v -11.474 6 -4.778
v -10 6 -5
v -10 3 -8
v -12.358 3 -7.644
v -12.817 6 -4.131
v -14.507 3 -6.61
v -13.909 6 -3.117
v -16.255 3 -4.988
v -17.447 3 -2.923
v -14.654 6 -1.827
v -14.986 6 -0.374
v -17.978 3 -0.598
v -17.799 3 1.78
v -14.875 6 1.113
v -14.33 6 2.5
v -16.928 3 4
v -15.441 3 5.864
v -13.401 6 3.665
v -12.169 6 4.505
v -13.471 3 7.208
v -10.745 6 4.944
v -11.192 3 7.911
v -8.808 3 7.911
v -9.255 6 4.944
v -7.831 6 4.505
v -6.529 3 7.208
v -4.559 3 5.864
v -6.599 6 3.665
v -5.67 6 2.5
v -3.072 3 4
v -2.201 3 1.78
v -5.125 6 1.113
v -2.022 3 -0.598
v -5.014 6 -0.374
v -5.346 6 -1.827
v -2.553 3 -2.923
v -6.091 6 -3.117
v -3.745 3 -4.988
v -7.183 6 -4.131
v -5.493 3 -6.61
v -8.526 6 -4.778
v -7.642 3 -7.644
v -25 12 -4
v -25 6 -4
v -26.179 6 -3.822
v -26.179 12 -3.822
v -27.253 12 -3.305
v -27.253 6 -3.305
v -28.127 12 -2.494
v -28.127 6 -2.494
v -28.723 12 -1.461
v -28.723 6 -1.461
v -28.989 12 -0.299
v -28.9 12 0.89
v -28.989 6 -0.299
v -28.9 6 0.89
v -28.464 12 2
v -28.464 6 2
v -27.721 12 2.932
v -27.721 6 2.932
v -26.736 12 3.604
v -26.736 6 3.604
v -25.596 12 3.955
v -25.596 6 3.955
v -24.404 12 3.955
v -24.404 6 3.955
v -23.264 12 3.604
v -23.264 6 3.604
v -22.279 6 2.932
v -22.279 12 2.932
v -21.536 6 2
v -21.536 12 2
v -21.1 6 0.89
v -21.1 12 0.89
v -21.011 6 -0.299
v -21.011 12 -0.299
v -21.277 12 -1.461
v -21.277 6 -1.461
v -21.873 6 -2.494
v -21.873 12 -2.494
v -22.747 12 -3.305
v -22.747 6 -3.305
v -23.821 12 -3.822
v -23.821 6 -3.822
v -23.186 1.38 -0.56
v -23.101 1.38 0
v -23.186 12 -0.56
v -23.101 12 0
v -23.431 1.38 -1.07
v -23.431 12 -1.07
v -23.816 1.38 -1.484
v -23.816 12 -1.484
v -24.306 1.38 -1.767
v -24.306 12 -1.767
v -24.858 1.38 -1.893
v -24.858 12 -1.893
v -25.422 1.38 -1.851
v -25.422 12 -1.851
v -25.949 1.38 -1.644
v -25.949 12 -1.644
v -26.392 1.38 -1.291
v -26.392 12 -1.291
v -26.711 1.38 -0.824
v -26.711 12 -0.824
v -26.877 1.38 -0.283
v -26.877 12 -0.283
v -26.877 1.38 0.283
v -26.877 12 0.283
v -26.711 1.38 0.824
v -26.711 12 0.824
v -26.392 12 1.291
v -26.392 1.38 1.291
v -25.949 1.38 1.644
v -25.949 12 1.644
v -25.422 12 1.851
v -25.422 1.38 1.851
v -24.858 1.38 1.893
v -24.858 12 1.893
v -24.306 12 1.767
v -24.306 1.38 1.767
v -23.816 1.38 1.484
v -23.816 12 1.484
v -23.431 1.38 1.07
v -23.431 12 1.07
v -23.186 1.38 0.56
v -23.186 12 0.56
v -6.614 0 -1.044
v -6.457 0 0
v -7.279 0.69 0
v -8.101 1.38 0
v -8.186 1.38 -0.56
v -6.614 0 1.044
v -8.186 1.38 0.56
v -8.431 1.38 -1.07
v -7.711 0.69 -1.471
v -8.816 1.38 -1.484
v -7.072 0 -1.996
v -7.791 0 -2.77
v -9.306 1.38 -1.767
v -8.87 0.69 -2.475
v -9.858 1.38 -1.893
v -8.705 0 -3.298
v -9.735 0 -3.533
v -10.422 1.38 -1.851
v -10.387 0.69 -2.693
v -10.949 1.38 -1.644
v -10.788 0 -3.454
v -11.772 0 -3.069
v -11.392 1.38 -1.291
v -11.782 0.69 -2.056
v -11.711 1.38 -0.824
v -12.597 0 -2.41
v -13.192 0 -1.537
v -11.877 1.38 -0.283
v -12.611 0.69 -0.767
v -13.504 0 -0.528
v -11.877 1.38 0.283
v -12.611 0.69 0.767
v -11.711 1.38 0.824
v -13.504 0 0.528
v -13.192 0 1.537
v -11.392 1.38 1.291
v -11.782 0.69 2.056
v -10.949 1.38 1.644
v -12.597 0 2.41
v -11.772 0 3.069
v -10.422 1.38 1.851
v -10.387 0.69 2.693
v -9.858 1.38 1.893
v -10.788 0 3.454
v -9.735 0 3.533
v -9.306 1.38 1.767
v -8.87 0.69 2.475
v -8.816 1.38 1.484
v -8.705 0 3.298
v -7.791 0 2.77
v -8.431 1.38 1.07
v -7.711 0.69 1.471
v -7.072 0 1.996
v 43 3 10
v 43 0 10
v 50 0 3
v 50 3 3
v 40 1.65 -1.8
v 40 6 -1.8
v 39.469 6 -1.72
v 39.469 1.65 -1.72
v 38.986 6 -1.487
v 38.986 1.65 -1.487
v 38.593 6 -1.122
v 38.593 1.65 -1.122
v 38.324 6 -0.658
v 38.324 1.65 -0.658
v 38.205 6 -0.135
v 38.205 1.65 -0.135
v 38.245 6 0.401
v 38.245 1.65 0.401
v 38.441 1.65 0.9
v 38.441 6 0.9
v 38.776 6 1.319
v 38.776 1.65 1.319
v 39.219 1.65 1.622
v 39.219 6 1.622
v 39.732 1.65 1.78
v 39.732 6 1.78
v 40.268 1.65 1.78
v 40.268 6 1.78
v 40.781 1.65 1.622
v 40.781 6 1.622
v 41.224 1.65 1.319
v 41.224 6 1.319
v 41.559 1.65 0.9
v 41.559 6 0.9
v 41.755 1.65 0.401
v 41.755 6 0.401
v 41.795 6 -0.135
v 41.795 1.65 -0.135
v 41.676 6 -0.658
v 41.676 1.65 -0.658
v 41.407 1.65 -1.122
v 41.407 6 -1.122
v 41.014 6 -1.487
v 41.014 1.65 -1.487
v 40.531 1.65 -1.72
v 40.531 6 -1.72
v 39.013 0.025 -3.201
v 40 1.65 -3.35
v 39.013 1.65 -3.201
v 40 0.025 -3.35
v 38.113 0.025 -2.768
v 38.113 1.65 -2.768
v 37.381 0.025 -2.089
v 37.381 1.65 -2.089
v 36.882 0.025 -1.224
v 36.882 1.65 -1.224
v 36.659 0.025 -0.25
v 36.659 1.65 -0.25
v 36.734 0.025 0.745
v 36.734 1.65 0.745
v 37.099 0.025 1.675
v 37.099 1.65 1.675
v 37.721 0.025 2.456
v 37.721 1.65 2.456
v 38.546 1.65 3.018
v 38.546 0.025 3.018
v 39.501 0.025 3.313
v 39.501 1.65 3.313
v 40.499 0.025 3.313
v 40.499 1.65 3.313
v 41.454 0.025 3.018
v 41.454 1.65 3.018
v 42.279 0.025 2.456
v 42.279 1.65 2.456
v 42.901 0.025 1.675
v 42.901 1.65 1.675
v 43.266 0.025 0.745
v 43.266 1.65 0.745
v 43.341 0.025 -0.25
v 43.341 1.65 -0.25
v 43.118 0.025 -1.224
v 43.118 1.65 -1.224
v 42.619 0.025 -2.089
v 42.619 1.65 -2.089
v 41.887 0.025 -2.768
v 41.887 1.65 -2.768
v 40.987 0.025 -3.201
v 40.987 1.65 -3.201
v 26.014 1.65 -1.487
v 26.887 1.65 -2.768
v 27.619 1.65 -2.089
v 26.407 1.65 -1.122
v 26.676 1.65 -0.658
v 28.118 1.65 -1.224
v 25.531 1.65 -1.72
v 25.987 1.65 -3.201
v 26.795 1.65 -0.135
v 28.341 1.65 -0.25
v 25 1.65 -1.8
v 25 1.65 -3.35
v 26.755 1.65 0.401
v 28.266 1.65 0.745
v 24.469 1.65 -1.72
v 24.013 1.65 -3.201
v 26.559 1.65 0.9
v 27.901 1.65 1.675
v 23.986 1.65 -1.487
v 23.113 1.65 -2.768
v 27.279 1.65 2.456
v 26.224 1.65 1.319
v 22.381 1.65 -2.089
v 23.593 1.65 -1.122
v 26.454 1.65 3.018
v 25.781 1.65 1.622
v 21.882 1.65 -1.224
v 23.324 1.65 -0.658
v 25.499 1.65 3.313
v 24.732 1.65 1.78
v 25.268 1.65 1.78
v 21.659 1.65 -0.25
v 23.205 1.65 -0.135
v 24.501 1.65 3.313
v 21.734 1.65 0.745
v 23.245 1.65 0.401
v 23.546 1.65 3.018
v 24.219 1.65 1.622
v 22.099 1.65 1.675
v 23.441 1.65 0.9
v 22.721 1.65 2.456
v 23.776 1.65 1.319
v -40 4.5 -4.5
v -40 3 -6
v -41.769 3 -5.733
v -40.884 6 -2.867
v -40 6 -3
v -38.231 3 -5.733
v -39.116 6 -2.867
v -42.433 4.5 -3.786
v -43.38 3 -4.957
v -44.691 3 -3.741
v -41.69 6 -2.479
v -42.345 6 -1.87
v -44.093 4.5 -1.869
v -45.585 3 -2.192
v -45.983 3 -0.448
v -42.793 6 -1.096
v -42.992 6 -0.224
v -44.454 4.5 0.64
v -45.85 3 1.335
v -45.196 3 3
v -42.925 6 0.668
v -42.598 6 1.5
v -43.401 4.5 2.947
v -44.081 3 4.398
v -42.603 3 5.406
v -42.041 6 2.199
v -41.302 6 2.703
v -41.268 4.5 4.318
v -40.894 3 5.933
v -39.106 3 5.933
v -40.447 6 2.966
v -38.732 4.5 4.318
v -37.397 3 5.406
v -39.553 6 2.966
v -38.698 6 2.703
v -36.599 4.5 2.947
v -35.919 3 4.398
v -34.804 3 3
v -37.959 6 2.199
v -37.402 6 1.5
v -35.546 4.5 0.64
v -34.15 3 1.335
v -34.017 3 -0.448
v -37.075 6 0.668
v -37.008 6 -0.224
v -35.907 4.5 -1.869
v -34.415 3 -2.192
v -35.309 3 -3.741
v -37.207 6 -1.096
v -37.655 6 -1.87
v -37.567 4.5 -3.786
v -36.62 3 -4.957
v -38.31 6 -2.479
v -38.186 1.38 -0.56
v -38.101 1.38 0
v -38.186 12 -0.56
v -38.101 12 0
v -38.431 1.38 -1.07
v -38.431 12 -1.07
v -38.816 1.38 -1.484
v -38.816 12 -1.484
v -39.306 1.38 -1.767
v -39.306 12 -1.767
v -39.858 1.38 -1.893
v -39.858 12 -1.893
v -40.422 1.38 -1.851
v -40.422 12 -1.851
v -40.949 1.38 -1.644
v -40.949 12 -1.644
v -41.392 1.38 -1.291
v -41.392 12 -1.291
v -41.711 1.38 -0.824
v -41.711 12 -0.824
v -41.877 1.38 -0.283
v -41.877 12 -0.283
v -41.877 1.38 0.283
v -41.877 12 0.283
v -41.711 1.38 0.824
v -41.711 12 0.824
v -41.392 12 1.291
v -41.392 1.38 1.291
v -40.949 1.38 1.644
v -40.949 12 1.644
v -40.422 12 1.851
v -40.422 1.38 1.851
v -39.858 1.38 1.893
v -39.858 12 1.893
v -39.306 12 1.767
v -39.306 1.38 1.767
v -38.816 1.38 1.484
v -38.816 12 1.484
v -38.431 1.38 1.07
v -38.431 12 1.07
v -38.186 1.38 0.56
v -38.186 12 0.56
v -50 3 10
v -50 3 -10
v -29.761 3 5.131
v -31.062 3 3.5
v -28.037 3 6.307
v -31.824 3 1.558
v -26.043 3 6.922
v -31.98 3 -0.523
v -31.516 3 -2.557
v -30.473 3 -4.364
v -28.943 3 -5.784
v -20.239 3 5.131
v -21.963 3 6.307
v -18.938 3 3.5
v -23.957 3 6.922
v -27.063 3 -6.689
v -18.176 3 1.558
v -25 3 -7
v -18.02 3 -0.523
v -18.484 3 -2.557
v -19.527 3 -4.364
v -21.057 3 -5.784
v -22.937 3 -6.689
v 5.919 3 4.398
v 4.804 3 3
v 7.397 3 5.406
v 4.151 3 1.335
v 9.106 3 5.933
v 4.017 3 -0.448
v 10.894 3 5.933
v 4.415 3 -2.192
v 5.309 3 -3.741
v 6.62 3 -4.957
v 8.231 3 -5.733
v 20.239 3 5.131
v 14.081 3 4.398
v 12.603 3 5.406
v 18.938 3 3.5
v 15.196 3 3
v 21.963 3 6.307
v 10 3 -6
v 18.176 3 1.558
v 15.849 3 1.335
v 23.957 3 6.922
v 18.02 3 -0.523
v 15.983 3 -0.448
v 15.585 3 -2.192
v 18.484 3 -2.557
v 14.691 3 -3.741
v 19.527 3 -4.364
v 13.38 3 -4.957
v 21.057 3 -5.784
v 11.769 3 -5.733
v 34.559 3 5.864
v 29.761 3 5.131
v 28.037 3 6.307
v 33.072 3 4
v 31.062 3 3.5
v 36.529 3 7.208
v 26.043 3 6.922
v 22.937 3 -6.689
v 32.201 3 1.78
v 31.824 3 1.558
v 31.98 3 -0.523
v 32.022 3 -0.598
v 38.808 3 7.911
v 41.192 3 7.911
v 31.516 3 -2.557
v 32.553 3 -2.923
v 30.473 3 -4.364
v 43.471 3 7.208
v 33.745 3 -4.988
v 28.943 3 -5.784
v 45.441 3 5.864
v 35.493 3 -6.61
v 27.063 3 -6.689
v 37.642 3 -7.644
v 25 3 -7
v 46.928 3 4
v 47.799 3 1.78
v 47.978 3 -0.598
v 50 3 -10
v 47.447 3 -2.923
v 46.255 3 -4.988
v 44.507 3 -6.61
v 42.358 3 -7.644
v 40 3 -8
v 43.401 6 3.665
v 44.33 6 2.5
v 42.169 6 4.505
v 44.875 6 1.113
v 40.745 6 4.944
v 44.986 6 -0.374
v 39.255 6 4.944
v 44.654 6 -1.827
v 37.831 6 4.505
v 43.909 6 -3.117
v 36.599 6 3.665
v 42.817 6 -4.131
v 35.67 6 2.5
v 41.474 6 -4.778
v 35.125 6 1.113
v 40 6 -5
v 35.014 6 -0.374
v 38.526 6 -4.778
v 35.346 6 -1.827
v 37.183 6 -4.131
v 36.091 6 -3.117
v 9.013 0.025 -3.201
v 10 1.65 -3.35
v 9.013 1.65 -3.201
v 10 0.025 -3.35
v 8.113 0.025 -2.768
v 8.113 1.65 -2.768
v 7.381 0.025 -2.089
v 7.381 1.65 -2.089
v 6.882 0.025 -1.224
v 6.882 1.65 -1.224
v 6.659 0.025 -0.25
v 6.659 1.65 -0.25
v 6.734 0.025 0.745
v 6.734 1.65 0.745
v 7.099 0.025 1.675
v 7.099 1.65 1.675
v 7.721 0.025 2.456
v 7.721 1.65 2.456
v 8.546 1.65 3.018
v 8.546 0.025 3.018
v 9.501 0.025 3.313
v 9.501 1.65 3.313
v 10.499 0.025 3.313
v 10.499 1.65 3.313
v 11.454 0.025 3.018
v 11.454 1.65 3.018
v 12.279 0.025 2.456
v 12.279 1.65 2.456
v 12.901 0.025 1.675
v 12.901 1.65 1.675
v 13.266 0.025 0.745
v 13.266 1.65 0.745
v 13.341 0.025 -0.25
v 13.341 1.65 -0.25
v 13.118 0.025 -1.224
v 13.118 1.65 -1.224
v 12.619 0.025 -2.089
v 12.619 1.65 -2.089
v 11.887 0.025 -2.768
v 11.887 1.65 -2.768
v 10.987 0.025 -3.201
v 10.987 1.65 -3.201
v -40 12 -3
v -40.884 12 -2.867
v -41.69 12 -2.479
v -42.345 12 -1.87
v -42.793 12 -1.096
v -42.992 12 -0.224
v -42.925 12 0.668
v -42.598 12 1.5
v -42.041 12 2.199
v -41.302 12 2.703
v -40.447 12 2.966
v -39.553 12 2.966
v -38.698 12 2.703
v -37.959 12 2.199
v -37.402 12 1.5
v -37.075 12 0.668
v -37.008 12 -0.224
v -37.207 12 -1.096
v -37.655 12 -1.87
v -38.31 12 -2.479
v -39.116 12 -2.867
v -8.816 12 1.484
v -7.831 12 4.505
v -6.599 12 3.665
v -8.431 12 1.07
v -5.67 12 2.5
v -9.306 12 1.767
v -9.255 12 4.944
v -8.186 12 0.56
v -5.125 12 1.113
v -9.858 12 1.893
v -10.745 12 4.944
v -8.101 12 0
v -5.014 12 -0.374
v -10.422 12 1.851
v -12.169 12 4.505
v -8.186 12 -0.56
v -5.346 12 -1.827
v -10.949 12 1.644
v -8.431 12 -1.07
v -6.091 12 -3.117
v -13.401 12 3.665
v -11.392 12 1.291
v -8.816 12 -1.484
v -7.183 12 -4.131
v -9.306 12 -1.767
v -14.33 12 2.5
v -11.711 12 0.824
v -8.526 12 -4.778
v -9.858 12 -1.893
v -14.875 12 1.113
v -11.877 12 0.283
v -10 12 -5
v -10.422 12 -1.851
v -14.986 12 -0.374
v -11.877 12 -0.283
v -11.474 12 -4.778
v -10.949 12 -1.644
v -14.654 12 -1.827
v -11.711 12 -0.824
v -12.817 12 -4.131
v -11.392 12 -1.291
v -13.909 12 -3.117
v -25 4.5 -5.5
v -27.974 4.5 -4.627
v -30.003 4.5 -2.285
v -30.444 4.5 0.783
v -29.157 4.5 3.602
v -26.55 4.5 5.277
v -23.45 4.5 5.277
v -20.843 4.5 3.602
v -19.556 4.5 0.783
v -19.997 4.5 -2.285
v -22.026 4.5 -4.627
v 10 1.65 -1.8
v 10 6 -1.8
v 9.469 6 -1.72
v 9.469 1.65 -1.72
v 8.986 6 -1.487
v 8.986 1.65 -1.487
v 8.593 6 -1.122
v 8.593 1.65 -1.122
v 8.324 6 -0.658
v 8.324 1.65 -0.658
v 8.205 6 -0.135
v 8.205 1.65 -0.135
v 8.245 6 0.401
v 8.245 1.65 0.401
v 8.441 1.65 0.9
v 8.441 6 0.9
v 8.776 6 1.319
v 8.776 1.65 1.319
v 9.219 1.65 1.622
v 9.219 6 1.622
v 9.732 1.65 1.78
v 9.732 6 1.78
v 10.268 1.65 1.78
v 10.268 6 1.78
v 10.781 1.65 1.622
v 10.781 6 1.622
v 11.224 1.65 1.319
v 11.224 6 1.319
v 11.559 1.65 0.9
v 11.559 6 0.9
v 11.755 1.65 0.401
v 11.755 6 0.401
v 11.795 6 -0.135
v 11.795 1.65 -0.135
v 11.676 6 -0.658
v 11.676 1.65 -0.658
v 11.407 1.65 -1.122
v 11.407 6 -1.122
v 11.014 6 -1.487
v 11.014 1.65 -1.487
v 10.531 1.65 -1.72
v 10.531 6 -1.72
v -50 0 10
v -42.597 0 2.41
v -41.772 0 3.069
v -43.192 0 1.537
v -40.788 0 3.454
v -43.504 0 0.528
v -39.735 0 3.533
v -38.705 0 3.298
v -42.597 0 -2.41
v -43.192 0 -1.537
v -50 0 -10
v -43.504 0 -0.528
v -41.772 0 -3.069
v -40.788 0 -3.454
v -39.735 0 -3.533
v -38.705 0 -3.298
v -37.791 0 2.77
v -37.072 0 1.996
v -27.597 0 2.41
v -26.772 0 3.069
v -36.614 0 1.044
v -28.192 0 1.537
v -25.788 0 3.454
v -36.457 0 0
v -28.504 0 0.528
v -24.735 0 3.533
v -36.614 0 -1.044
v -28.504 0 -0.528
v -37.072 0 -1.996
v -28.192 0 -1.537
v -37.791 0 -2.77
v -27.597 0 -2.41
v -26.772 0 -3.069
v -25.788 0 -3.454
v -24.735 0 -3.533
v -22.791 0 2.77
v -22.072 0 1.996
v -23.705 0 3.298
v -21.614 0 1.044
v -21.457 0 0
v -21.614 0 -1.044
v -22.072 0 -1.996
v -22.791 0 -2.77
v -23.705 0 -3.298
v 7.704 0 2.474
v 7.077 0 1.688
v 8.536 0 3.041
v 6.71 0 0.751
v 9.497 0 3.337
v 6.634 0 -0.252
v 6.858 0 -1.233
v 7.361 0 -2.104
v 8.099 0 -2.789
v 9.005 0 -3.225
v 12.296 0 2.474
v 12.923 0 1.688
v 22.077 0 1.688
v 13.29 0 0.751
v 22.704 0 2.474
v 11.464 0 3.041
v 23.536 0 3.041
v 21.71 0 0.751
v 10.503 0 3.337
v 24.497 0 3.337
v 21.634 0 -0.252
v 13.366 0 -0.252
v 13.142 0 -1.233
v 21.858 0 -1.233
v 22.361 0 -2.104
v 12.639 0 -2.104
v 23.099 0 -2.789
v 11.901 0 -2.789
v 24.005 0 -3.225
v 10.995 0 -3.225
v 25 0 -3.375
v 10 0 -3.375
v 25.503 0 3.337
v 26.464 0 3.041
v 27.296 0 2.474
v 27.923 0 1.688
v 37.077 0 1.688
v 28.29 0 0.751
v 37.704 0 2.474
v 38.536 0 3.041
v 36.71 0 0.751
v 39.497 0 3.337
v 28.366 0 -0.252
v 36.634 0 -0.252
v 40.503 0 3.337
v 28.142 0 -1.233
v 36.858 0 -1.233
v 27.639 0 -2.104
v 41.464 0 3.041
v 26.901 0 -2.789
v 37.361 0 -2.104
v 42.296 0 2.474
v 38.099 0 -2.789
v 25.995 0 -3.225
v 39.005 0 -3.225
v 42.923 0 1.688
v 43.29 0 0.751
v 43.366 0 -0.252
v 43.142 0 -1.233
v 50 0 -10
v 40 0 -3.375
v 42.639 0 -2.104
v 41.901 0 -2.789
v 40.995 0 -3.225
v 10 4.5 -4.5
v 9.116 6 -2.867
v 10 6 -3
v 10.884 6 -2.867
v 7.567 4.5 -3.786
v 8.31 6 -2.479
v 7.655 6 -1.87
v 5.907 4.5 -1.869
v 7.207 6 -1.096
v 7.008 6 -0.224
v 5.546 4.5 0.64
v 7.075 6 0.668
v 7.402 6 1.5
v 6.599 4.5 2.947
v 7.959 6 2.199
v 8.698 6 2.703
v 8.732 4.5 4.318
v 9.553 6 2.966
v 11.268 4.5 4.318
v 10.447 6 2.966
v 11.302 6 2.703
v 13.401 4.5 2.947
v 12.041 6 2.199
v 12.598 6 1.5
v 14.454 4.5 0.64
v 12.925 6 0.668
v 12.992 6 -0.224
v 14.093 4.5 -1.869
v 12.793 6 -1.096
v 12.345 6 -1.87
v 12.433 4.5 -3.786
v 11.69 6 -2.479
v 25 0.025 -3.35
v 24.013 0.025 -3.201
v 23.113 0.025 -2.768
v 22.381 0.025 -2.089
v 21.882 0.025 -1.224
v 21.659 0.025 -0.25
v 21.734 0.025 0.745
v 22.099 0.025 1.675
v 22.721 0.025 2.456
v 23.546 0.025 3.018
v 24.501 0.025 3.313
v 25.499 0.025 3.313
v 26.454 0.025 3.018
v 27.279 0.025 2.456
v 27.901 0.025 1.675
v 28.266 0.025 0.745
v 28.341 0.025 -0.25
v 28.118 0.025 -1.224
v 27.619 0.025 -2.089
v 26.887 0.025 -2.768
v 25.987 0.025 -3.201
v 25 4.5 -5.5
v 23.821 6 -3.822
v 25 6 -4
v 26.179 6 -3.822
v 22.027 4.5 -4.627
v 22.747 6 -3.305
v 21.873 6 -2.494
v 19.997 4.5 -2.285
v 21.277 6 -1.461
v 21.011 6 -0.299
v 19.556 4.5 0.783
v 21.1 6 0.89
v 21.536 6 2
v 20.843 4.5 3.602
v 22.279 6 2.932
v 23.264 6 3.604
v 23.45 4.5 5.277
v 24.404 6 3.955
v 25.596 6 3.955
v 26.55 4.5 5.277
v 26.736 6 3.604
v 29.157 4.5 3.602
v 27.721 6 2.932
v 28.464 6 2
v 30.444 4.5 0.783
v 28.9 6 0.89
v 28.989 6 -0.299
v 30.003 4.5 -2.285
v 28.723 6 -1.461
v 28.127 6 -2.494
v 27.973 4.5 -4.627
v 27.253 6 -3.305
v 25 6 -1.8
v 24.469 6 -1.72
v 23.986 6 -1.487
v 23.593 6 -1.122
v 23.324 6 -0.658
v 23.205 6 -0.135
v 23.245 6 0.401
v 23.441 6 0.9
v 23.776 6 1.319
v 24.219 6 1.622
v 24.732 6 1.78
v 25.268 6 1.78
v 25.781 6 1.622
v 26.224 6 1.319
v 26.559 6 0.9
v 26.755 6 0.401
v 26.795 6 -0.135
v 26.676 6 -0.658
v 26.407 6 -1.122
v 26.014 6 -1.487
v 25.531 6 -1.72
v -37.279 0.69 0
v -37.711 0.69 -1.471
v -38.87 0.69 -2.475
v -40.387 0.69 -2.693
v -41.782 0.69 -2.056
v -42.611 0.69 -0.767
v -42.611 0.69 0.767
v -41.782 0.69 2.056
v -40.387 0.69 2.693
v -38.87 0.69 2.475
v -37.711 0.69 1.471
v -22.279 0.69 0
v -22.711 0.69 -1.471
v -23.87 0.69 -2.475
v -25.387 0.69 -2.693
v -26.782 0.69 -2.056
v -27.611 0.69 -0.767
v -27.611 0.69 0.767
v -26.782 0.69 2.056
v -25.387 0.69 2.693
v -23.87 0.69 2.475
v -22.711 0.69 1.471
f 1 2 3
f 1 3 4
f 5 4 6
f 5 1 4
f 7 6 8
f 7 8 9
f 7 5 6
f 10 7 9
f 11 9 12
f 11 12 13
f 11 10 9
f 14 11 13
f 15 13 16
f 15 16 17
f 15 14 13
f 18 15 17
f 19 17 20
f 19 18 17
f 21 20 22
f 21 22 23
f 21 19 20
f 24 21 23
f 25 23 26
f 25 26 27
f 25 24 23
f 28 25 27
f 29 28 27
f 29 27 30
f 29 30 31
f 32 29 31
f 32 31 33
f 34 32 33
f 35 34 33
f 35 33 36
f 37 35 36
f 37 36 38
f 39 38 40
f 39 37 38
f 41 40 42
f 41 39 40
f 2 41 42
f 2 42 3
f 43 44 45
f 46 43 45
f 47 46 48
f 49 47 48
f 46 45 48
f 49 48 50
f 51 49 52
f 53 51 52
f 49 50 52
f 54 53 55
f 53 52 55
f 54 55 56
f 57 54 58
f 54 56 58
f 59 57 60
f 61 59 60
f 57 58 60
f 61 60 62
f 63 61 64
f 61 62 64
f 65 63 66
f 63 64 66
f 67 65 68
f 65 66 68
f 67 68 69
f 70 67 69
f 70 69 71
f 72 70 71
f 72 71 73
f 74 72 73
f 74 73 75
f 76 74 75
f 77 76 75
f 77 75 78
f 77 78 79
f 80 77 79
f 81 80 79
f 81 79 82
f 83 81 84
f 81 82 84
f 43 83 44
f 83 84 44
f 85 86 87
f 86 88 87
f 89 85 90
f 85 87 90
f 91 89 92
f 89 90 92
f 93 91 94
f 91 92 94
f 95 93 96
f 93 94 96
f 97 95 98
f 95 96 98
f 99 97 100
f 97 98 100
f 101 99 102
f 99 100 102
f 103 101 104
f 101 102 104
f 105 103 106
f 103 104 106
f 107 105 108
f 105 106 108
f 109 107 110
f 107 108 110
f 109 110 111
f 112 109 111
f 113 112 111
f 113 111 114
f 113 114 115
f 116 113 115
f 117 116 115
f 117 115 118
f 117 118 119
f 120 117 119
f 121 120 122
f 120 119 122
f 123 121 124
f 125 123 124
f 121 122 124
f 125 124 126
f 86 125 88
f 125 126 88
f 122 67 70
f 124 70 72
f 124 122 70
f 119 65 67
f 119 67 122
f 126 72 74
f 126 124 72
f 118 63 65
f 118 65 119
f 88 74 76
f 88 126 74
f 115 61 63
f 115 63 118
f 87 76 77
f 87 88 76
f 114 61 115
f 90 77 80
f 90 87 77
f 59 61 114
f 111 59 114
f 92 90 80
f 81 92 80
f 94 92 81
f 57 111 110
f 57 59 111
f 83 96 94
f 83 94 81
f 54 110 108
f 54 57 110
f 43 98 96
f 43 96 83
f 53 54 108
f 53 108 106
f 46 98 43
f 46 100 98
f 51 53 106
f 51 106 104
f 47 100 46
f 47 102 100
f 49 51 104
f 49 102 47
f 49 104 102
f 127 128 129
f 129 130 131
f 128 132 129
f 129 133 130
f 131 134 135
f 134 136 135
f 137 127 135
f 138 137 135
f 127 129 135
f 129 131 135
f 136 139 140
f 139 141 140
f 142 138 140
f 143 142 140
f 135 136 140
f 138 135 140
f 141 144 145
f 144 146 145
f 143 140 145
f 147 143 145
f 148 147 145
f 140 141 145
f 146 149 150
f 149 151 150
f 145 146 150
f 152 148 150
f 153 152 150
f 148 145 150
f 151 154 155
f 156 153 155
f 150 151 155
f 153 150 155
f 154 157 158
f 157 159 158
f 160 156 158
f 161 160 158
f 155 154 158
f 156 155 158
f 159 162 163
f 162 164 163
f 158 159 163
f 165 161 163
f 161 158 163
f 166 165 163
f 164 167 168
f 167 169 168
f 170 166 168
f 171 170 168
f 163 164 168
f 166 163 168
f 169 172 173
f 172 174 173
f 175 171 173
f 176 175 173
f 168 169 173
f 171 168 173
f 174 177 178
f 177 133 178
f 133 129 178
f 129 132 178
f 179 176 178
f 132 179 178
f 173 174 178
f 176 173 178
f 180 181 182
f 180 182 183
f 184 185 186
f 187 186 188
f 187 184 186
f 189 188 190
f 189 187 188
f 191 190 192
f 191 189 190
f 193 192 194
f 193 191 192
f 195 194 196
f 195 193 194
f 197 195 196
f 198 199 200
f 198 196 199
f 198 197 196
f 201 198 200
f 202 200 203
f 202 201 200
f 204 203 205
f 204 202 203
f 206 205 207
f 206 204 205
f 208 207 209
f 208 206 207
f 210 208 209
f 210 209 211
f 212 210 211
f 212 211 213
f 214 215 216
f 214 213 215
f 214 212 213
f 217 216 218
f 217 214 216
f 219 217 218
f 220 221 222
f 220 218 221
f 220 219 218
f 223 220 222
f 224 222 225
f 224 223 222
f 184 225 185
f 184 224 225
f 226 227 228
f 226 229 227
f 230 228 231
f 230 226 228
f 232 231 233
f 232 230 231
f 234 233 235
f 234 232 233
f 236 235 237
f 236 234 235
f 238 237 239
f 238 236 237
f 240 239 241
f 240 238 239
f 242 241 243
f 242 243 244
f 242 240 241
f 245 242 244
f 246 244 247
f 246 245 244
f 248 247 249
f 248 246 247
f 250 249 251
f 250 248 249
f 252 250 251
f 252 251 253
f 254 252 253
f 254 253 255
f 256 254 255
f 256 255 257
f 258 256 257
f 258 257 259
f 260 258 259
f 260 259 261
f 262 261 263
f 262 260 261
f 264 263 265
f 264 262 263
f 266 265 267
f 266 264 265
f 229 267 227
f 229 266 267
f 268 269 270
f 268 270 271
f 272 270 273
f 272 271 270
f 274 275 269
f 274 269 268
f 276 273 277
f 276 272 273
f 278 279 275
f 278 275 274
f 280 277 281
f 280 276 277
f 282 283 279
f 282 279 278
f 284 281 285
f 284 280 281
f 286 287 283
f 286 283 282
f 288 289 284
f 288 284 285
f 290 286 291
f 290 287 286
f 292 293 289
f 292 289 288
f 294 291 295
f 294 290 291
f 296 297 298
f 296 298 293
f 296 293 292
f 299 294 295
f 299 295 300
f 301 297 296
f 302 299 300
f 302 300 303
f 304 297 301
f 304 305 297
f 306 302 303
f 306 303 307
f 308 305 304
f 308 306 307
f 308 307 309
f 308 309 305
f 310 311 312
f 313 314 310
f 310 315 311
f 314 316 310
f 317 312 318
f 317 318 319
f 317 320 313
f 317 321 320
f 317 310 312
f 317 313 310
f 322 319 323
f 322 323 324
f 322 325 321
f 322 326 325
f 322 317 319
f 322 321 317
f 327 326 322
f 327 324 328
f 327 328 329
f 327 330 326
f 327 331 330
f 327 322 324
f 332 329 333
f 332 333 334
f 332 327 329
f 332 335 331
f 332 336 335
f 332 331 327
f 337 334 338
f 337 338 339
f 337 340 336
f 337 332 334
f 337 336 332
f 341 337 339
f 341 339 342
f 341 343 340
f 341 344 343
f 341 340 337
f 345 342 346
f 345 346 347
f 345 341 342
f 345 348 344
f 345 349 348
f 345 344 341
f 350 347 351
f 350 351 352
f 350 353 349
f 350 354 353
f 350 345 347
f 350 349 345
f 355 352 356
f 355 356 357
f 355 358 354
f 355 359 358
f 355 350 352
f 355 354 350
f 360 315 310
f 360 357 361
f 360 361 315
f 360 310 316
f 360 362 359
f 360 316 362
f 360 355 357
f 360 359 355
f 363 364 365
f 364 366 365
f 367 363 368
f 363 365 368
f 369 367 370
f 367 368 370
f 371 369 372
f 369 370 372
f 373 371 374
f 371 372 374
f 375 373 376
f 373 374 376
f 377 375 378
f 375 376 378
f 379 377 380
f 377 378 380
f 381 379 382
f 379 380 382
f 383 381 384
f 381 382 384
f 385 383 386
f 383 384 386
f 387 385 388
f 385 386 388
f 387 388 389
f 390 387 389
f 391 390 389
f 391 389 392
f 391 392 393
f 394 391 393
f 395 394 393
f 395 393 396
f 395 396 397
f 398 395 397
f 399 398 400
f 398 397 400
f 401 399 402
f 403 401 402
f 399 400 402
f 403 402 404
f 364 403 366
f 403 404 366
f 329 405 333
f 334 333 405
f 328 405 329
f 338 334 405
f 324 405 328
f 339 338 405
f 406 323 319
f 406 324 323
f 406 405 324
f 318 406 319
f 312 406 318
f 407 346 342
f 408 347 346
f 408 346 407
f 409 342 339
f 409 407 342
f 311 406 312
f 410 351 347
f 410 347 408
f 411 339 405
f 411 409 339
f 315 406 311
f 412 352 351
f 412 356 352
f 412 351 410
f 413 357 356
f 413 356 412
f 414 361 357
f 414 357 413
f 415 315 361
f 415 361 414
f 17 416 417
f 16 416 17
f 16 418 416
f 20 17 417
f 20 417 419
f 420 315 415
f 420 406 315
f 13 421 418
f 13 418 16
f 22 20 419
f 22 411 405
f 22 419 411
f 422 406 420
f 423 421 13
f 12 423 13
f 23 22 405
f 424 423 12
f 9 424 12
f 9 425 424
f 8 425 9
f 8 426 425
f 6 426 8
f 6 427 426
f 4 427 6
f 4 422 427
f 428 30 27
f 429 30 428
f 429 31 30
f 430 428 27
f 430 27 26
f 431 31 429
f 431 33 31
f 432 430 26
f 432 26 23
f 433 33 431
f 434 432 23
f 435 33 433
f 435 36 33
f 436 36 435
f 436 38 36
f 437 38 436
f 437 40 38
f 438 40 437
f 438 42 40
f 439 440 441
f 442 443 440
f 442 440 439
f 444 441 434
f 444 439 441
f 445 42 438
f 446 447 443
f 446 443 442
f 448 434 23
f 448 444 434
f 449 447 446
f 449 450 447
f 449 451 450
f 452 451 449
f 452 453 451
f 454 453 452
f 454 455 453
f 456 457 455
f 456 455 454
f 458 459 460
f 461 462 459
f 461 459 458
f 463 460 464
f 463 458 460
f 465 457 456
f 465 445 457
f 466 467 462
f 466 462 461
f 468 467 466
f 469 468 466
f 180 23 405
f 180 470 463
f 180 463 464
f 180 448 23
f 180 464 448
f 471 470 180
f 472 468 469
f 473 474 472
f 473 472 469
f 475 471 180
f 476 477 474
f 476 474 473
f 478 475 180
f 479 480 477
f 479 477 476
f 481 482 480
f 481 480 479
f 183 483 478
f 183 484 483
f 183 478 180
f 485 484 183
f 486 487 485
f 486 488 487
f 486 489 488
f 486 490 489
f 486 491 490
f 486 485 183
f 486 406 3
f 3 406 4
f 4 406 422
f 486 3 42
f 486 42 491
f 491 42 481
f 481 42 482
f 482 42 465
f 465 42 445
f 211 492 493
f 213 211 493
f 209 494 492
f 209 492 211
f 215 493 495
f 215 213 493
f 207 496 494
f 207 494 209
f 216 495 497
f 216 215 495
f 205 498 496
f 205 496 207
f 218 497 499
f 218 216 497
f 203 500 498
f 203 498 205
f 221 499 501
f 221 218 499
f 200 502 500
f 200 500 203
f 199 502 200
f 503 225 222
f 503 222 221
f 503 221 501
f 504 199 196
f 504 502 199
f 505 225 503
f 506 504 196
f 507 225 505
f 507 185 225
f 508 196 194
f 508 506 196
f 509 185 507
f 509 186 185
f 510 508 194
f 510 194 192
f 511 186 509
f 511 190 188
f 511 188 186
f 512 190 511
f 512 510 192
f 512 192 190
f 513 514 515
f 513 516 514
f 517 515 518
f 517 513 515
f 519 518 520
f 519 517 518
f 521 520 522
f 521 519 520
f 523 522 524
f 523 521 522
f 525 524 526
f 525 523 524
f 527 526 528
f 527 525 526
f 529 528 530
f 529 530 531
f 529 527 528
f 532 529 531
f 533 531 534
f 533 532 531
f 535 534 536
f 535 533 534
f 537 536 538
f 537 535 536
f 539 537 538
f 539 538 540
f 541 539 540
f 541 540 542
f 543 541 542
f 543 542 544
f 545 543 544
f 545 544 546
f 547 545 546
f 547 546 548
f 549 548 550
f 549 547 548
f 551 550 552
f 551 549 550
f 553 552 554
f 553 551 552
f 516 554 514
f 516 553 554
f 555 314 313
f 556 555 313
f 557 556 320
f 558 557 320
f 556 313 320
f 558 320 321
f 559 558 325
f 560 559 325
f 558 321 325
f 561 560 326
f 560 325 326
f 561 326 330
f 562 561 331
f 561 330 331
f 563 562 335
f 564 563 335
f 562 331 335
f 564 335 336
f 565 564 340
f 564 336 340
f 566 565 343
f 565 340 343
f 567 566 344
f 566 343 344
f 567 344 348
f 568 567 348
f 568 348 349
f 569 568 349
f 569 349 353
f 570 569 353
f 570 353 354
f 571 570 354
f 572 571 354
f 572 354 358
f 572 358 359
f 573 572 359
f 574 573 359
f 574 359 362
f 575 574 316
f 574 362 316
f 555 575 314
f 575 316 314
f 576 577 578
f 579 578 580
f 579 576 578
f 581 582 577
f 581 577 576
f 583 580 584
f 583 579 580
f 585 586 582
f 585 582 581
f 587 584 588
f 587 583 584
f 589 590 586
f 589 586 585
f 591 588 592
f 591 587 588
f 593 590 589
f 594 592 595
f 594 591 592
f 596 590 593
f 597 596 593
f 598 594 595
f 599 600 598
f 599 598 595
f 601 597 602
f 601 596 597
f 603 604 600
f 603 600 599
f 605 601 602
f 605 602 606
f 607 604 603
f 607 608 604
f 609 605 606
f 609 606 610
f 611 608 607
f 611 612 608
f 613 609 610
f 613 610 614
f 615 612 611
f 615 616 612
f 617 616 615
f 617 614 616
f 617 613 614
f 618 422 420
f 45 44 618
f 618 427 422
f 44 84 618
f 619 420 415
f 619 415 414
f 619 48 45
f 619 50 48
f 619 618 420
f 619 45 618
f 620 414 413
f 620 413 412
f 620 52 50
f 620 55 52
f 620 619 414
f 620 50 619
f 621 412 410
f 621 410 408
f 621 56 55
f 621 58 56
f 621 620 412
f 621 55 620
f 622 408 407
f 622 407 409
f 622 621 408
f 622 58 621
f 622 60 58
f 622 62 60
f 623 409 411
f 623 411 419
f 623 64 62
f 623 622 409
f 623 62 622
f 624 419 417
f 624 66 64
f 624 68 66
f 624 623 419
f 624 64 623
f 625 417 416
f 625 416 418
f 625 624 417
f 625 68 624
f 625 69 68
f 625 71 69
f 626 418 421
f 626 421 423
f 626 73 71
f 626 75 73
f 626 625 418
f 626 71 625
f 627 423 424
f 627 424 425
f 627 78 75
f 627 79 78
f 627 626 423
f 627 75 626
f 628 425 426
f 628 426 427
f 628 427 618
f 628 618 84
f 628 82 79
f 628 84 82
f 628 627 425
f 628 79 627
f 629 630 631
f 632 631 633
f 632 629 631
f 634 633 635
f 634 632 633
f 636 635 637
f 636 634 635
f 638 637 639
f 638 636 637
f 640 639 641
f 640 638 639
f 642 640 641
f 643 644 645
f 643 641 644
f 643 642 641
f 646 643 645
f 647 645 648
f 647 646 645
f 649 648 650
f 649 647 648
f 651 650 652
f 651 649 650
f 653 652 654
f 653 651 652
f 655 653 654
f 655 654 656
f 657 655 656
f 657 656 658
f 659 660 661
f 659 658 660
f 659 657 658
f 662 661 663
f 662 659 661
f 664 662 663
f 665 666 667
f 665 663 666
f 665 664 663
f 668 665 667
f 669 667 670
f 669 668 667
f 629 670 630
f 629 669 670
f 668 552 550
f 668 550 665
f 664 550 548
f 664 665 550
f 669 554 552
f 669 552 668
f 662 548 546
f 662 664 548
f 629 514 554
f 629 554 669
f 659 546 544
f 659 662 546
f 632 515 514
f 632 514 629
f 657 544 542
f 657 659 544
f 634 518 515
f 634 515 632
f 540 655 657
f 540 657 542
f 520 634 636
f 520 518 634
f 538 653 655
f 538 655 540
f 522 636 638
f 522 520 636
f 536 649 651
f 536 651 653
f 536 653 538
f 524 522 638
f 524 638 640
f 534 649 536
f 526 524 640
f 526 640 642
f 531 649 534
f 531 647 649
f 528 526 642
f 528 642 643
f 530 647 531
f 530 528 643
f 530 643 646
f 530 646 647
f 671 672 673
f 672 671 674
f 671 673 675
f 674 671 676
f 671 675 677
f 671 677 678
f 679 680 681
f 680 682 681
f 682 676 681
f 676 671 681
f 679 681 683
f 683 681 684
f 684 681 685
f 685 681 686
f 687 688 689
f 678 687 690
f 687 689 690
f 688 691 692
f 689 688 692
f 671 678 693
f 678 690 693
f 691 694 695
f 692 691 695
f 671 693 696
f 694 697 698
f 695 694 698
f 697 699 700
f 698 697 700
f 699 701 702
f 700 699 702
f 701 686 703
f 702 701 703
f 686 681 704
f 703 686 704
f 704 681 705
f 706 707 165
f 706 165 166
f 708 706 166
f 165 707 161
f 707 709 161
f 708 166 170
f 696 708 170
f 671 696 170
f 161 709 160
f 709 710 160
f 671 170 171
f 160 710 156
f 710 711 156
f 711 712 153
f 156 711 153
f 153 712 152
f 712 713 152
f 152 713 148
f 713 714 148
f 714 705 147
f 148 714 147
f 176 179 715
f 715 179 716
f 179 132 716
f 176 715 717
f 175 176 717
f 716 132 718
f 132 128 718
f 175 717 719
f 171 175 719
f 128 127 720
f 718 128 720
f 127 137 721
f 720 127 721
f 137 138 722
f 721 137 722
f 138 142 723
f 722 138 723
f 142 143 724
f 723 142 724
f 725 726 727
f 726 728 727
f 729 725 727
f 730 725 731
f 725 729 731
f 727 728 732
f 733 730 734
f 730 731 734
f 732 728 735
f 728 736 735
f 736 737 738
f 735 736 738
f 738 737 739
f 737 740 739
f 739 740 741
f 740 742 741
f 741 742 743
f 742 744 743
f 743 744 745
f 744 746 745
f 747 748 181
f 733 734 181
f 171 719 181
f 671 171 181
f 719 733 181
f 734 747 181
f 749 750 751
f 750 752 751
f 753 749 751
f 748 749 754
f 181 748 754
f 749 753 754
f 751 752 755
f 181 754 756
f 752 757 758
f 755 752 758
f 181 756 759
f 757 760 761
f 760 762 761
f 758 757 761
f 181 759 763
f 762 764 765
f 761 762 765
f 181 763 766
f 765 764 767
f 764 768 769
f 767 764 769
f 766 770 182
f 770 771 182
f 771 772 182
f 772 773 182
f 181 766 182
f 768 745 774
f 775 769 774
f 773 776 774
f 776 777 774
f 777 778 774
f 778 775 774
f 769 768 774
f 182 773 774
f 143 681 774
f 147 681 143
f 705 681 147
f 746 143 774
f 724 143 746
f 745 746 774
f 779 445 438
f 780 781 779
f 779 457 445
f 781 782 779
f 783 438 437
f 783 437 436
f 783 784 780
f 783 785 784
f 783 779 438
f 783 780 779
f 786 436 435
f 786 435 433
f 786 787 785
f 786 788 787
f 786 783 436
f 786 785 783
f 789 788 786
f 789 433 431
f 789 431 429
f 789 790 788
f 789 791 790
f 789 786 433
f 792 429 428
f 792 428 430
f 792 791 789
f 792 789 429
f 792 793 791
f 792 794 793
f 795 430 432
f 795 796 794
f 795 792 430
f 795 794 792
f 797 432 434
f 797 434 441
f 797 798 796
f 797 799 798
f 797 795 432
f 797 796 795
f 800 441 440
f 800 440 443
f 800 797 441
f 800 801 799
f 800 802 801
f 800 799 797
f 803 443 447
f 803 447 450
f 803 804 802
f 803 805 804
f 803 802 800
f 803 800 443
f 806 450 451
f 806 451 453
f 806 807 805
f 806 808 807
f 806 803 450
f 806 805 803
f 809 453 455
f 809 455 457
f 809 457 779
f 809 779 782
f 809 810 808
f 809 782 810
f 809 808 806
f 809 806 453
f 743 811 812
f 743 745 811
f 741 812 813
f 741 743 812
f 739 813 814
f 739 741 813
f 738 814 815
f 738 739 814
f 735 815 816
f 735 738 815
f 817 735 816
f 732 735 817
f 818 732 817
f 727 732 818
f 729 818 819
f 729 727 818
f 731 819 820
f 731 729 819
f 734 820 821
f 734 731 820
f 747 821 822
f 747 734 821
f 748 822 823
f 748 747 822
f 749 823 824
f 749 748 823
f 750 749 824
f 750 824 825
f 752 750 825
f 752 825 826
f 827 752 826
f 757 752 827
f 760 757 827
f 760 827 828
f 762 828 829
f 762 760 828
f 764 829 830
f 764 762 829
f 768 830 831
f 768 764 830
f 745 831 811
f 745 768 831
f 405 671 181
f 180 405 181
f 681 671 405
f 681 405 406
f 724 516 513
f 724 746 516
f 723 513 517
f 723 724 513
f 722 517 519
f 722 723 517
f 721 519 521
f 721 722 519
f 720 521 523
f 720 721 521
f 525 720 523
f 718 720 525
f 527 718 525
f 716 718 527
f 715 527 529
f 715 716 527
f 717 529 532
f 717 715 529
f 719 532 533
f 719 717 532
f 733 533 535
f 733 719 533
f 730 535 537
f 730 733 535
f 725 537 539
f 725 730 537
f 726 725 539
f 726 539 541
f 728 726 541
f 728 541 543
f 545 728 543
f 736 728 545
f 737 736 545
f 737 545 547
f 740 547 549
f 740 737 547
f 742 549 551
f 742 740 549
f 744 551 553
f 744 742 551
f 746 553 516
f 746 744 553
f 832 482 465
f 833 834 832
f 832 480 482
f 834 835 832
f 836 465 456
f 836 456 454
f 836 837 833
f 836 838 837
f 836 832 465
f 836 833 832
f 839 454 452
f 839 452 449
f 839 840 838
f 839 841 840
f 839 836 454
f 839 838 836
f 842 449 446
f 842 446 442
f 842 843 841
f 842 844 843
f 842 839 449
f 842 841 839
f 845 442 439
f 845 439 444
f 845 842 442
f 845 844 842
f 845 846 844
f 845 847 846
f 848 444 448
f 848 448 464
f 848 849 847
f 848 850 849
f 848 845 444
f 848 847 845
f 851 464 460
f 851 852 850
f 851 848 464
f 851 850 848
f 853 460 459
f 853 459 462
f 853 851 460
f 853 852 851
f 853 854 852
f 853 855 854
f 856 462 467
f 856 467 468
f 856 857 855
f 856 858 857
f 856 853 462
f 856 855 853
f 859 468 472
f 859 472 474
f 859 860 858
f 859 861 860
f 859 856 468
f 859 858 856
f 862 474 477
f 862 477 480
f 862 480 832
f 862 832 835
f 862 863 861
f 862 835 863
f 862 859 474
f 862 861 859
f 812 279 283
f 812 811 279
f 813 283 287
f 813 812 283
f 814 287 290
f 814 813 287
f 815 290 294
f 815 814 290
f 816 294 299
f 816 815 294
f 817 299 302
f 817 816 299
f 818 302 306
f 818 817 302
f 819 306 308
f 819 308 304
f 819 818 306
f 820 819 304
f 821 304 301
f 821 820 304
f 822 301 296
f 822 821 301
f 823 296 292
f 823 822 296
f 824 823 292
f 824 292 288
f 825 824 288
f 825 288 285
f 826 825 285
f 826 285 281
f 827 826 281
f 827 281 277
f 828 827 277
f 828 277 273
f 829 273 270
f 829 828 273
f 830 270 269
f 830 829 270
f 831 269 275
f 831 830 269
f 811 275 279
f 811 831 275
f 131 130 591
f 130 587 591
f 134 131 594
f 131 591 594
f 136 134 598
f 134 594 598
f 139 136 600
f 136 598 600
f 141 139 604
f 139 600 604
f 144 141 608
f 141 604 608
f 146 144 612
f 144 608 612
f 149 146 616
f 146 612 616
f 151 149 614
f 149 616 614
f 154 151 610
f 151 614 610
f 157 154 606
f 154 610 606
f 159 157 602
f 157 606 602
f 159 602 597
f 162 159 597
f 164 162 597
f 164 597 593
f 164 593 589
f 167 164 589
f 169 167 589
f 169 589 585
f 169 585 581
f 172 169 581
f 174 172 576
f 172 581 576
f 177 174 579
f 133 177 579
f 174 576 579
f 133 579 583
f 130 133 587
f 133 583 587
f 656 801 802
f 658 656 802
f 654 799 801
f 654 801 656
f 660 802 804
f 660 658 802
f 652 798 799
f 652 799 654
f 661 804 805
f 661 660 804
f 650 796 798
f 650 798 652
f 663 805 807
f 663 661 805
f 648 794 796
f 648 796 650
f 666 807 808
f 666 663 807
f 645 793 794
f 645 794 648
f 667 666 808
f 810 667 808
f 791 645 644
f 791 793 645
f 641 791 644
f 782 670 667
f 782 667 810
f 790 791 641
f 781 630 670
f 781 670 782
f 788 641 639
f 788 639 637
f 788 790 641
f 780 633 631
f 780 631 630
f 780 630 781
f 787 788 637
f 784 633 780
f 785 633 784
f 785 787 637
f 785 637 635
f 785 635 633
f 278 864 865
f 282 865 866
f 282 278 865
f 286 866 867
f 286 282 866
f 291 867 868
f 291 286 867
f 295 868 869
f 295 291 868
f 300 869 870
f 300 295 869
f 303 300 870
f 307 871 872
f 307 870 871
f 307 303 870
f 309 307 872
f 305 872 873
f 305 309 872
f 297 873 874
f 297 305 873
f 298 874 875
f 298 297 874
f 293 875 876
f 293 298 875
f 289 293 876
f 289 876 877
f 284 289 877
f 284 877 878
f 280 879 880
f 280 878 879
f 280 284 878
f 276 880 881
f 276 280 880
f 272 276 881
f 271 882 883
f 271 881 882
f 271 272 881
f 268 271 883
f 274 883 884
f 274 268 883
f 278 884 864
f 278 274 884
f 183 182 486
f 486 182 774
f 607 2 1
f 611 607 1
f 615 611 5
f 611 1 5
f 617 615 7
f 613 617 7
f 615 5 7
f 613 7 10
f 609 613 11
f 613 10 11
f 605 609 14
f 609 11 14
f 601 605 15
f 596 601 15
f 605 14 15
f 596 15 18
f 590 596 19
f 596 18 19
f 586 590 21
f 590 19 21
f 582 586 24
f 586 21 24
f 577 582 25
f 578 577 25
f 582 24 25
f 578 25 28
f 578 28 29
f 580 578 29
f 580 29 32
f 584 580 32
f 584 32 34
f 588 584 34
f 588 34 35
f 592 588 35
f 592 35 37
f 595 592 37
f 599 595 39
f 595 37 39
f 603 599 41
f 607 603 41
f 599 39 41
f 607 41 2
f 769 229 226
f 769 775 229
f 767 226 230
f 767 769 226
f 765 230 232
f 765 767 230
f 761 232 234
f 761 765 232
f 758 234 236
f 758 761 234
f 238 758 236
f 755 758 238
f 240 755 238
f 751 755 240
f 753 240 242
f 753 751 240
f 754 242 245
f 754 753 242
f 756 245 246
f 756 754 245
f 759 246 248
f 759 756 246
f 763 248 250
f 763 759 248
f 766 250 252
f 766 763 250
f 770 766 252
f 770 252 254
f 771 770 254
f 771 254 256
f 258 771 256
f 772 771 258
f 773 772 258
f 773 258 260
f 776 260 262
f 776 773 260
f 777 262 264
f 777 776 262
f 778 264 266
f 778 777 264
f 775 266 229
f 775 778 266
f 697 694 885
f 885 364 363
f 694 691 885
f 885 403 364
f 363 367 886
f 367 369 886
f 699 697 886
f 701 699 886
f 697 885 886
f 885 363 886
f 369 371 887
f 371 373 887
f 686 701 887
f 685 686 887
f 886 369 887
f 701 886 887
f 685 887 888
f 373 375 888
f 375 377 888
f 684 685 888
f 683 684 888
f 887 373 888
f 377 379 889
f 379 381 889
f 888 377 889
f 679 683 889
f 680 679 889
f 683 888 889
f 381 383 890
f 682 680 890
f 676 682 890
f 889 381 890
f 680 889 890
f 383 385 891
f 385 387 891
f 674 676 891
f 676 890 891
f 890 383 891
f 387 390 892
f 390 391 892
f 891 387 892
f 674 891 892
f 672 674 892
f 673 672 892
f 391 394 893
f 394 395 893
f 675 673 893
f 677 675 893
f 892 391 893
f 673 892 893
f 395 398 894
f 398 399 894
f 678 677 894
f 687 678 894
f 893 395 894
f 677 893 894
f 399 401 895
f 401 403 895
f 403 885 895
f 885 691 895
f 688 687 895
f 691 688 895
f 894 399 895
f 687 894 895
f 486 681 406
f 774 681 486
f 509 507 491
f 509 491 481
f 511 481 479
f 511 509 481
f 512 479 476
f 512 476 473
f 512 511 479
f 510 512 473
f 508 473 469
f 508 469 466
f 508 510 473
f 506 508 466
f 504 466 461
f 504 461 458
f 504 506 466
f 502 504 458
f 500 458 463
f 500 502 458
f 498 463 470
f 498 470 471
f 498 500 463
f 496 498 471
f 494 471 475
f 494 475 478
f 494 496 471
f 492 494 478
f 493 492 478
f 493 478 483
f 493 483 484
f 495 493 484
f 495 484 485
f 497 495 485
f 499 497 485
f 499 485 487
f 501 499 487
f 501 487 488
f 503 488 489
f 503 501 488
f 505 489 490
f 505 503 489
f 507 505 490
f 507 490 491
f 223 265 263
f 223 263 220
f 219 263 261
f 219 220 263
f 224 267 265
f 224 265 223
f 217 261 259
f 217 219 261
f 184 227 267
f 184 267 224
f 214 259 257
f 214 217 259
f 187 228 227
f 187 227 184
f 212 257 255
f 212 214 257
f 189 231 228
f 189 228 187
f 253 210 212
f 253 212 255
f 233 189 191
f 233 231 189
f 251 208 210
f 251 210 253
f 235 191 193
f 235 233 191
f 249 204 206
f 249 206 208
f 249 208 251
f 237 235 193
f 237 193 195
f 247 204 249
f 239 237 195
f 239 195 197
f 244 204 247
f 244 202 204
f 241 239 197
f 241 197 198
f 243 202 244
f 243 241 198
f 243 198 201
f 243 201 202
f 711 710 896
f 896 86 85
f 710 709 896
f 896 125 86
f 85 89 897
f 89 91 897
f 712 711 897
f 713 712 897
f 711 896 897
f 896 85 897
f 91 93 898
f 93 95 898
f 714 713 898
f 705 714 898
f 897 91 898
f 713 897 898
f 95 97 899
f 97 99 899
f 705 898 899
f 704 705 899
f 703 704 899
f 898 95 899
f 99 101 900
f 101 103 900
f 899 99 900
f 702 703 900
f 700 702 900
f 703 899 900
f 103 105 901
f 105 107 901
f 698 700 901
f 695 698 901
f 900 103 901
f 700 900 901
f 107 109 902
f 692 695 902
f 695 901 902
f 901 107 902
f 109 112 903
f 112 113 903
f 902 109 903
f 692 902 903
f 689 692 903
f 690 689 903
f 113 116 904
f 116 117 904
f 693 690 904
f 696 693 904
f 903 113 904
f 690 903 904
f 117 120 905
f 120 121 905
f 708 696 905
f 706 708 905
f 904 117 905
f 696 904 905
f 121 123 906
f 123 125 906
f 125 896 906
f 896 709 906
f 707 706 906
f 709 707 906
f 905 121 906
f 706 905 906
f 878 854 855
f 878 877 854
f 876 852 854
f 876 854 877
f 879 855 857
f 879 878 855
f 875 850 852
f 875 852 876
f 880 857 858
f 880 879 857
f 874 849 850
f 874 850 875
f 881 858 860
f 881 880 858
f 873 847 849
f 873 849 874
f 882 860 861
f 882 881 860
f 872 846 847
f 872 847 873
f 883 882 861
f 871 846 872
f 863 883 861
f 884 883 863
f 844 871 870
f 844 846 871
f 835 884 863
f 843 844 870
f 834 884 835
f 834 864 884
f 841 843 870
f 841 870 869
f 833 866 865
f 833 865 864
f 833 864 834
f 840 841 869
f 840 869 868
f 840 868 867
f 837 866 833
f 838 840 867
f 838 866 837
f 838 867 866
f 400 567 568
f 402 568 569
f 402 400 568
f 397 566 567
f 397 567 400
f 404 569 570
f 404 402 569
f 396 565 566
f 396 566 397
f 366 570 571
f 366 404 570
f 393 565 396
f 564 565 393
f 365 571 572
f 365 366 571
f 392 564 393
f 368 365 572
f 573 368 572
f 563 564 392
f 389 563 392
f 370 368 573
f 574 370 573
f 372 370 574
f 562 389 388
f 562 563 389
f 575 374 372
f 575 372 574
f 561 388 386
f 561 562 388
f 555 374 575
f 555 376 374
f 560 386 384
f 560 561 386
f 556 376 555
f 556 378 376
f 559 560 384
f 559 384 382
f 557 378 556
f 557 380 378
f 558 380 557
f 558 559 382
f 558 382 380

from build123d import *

# Parameters (mm, degrees)
SKETCH1_W                                         = 100
SKETCH1_H                                         = 20
BOSS_EXTRUDE1_DEPTH                               = 3
SKETCH2_R                                         = 4
SKETCH2_R_2                                       = 3
SKETCH2_R_3                                       = 5
BOSS_EXTRUDE2_DEPTH                               = 9
CHAMFER1_SIZE                                     = 3
CSK_FOR_6_FLAT_HEAD_MACHINE_SCREW_100_D           = 3.7973
CSK_FOR_6_FLAT_HEAD_MACHINE_SCREW_100_CSINK_D     = 7.0866
CSK_FOR_6_FLAT_HEAD_MACHINE_SCREW_100_CSINK_ANGLE = 100
CSK_FOR_6_FLAT_HEAD_MACHINE_SCREW_2_D             = 3.7973
CSK_FOR_6_FLAT_HEAD_MACHINE_SCREW_2_CSINK_D       = 7.0866
CSK_FOR_6_FLAT_HEAD_MACHINE_SCREW_2_CSINK_ANGLE   = 100
CSK_FOR_6_FLAT_HEAD_MACHINE_SCREW_3_D             = 3.7973
CSK_FOR_6_FLAT_HEAD_MACHINE_SCREW_3_CSINK_D       = 7.0866
CSK_FOR_6_FLAT_HEAD_MACHINE_SCREW_3_CSINK_ANGLE   = 100
CHAMFER2_SIZE                                     = 3
CHAMFER3_SIZE                                     = 3
SKETCH14_R                                        = 3
SKETCH14_R_2                                      = 4
SKETCH14_R_3                                      = 5
BOSS_EXTRUDE3_DEPTH                               = 3
CHAMFER4_SIZE                                     = 3
LPATTERN1_COUNT                                   = 3
LPATTERN1_PITCH                                   = 15
CHAMFER5_SIZE                                     = 7


with BuildPart() as part:
    # Sketch1 → Boss-Extrude1 (new body)
    with BuildSketch(Plane(origin=(0, 0, 0), x_dir=(1, 0, 0), z_dir=(0, 1, 0))):
        Rectangle(SKETCH1_W, SKETCH1_H)
    extrude(amount=BOSS_EXTRUDE1_DEPTH)

    # Sketch2 → Boss-Extrude2 (add)
    with BuildSketch(Plane(origin=(0, 3, 0), x_dir=(1, 0, 0), z_dir=(0, 1, 0))):
        with Locations(Location((-25, 0, 0), (0, 0, 90))):
            Circle(SKETCH2_R)
        with Locations(Location((-40, 0, 0), (0, 0, 90))):
            Circle(SKETCH2_R_2)
        with Locations(Location((-10, 0, 0), (0, 0, 90))):
            Circle(SKETCH2_R_3)
    extrude(amount=BOSS_EXTRUDE2_DEPTH)

    # Chamfer1
    chamfer1_edges = [part.edges().sort_by_distance(p)[0] for p in [
        (-40, 3, 3),
    ]]
    chamfer(chamfer1_edges, length=CHAMFER1_SIZE)

    # CSK for _6 Flat Head Machine Screw _100 (through all)
    with Locations(Plane(origin=(0, 0, 0), x_dir=(-1, 0, 0), z_dir=(0, -1, 0))):
        with Locations((40, 0)):
            CounterSinkHole(CSK_FOR_6_FLAT_HEAD_MACHINE_SCREW_100_D / 2, CSK_FOR_6_FLAT_HEAD_MACHINE_SCREW_100_CSINK_D / 2, counter_sink_angle=CSK_FOR_6_FLAT_HEAD_MACHINE_SCREW_100_CSINK_ANGLE)

    # CSK for _6 Flat Head Machine Screw _ 2 (through all)
    with Locations(Plane(origin=(0, 0, 0), x_dir=(-1, 0, 0), z_dir=(0, -1, 0))):
        with Locations((25, 0)):
            CounterSinkHole(CSK_FOR_6_FLAT_HEAD_MACHINE_SCREW_2_D / 2, CSK_FOR_6_FLAT_HEAD_MACHINE_SCREW_2_CSINK_D / 2, counter_sink_angle=CSK_FOR_6_FLAT_HEAD_MACHINE_SCREW_2_CSINK_ANGLE)

    # CSK for _6 Flat Head Machine Screw _ 3 (through all)
    with Locations(Plane(origin=(0, 0, 0), x_dir=(-1, 0, 0), z_dir=(0, -1, 0))):
        with Locations((10, 0)):
            CounterSinkHole(CSK_FOR_6_FLAT_HEAD_MACHINE_SCREW_3_D / 2, CSK_FOR_6_FLAT_HEAD_MACHINE_SCREW_3_CSINK_D / 2, counter_sink_angle=CSK_FOR_6_FLAT_HEAD_MACHINE_SCREW_3_CSINK_ANGLE)

    # Chamfer2
    chamfer2_edges = [part.edges().sort_by_distance(p)[0] for p in [
        (-25, 3, 4),
    ]]
    chamfer(chamfer2_edges, length=CHAMFER2_SIZE)

    # Chamfer3
    chamfer3_edges = [part.edges().sort_by_distance(p)[0] for p in [
        (-10, 3, 5),
    ]]
    chamfer(chamfer3_edges, length=CHAMFER3_SIZE - 0.0001)  # a hair under: the kernel refuses the full size

    # Sketch14 → Boss-Extrude3 (add)
    with BuildSketch(Plane(origin=(0, 3, 0), x_dir=(1, 0, 0), z_dir=(0, 1, 0))):
        with Locations(Location((10, 0, 0), (0, 0, 90))):
            Circle(SKETCH14_R)
        with Locations(Location((25, 0, 0), (0, 0, 90))):
            Circle(SKETCH14_R_2)
        with Locations(Location((40, 0, 0), (0, 0, 90))):
            Circle(SKETCH14_R_3)
    extrude(amount=BOSS_EXTRUDE3_DEPTH)

    # Chamfer4
    chamfer4_edges = [part.edges().sort_by_distance(p)[0] for p in [
        (10, 3, 3),
        (25, 3, 4),
        (40, 3, 5),
    ]]
    chamfer(chamfer4_edges, length=CHAMFER4_SIZE - 0.0001)  # a hair under: the kernel refuses the full size

    # Sketch18 → CBORE for M3 SBHCS1 (revolve, cut)
    with BuildSketch(Plane(origin=(10, 0, 0), x_dir=(0, 0, -1), z_dir=(1, 0, 0))):
        Polygon((0, 0), (0, 12), (1.8, 12), (1.8, 1.65), (3.35, 1.65), (3.35, 0.025), (3.375, 0), align=None)
    cbore_for_m3_sbhcs1 = revolve(axis=Axis((10, -6.35, 0), (0, 1, 0)), mode=Mode.SUBTRACT)

    # LPattern1: CBORE for M3 SBHCS1 ×3
    with Locations(*[(i * LPATTERN1_PITCH, 0, 0) for i in range(1, LPATTERN1_COUNT)]):
        add(cbore_for_m3_sbhcs1, mode=Mode.SUBTRACT)

    # Chamfer5
    chamfer5_edges = [part.edges().sort_by_distance(p)[0] for p in [
        (50, 1.5, 10),
    ]]
    chamfer(chamfer5_edges, length=CHAMFER5_SIZE)


solid = part.part
